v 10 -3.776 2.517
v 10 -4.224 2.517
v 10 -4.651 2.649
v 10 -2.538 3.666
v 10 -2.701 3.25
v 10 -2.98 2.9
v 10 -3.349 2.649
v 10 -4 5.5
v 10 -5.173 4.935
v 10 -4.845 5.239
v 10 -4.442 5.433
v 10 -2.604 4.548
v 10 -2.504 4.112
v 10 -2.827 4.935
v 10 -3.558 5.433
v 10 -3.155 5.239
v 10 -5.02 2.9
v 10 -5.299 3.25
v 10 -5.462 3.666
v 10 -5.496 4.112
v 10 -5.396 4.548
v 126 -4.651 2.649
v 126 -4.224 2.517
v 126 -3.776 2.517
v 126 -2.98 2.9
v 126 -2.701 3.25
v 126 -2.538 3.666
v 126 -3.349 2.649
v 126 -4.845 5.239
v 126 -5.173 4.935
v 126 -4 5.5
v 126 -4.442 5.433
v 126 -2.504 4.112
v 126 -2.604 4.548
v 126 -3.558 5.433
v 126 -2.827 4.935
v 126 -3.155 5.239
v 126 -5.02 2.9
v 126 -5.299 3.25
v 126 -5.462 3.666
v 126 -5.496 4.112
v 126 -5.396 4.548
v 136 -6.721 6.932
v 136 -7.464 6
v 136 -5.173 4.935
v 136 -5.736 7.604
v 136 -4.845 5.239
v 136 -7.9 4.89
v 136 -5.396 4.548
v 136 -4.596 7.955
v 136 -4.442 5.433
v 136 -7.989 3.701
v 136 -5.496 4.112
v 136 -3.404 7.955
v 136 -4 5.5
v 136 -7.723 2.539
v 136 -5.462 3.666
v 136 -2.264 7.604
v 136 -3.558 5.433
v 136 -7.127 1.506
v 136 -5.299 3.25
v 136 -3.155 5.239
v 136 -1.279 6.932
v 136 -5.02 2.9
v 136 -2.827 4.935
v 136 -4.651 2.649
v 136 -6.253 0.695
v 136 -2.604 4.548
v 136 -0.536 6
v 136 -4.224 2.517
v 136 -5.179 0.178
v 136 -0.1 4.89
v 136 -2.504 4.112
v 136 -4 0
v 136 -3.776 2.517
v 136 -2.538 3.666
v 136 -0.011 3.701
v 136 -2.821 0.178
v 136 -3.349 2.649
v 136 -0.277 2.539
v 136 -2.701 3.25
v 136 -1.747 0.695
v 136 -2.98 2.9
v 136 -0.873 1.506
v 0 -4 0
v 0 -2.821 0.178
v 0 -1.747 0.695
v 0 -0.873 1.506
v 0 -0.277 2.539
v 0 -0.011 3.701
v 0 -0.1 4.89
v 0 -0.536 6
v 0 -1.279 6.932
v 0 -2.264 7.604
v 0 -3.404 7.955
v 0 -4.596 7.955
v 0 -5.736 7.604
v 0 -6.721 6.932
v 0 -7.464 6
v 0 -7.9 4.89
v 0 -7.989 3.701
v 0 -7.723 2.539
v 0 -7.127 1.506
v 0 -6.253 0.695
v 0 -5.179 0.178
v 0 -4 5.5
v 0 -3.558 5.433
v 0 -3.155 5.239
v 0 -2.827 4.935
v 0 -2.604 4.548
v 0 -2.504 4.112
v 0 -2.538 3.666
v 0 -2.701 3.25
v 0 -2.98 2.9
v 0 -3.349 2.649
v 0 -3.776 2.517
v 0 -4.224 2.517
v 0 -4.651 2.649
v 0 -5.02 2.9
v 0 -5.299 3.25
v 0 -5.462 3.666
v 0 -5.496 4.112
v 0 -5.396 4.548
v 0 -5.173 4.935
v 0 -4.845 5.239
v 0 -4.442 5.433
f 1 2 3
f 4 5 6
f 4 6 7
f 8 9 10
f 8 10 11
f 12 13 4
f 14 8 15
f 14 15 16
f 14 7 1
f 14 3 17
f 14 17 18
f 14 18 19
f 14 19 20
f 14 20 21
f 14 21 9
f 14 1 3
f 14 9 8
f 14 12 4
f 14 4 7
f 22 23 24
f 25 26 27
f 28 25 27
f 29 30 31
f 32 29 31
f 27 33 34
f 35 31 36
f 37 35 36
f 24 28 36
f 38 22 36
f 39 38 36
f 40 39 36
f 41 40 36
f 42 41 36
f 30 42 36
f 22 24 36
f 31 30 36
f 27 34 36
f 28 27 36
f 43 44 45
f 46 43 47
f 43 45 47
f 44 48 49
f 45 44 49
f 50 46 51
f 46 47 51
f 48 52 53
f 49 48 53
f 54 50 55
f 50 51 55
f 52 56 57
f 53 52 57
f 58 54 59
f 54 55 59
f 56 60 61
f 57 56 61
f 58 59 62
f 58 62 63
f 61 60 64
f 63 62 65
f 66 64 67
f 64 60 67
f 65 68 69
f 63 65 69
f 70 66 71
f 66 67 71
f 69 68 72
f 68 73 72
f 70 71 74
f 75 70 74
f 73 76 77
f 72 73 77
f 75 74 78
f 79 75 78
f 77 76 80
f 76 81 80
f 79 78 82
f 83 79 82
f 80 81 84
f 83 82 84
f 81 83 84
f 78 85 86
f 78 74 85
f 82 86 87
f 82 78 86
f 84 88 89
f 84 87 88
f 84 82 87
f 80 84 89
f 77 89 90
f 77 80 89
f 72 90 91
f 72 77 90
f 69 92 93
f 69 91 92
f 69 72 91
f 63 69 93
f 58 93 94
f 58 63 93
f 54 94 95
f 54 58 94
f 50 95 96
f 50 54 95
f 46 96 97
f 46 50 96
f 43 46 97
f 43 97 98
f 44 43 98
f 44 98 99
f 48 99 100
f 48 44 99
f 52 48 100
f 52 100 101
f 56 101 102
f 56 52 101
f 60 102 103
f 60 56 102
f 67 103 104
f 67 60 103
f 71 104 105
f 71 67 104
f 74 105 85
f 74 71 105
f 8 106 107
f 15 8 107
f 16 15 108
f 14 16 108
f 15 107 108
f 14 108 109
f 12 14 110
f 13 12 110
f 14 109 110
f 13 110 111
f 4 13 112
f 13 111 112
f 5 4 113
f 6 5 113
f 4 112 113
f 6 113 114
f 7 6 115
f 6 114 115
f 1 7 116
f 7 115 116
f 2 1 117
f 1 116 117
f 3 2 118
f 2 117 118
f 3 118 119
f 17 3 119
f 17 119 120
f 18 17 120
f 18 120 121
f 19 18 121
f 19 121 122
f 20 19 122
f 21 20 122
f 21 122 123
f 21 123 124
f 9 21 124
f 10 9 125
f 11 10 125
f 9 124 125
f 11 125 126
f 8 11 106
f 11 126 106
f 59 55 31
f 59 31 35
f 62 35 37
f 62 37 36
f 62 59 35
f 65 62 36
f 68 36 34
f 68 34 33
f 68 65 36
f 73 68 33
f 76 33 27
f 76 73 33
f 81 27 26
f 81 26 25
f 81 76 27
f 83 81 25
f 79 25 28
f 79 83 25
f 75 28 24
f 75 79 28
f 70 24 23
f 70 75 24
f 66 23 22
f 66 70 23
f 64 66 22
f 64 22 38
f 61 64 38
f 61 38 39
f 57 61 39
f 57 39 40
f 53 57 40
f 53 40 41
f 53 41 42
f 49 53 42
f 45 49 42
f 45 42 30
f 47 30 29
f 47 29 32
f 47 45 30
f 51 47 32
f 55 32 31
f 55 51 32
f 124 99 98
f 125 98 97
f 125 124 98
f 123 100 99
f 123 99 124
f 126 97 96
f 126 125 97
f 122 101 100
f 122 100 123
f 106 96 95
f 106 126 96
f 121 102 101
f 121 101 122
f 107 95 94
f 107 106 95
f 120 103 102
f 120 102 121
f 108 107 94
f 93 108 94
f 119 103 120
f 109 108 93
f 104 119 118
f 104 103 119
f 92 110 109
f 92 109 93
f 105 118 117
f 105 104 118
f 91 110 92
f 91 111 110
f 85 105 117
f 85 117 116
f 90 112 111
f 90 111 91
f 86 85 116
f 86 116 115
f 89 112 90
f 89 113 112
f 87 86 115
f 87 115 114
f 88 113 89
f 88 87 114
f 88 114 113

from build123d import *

# Parameters (mm, degrees)
SKETCH_1_W          = 136
SKETCH_1_H          = 8
EXTRUDE_1_DEPTH     = 8
SKETCH_2_R          = 1.5
CUT_EXTRUDE_1_DEPTH = 10
CUT_EXTRUDE_START   = -126
SKETCH_2_2_R        = 1.5
CUT_EXTRUDE_2_DEPTH = 10
SKETCH_3_R          = 6
SKETCH_3_R_2        = 4
CUT_EXTRUDE_3_DEPTH = 137.469776874


with BuildPart() as part:
    # 草图1 → 凸台-拉伸1 (new body)
    with BuildSketch(Plane.XY):
        with Locations((68, -4)):
            Rectangle(SKETCH_1_W, SKETCH_1_H)
    extrude(amount=EXTRUDE_1_DEPTH)

    # 草图2 → 切除-拉伸1 (cut)
    with BuildSketch(Plane.ZY):
        with Locations((4, -4)):
            Circle(SKETCH_2_R)
    extrude(amount=-CUT_EXTRUDE_1_DEPTH, mode=Mode.SUBTRACT)

    # 草图2<2> → 切除-拉伸2 (cut)
    with BuildSketch(Plane.ZY.offset(CUT_EXTRUDE_START)):
        with Locations((4, -4)):
            Circle(SKETCH_2_2_R)
    extrude(amount=-CUT_EXTRUDE_2_DEPTH, mode=Mode.SUBTRACT)

    # 草图3 → 切除-拉伸3 (cut, through all)
    with BuildSketch(Plane(origin=(136, 0, 0), x_dir=(0, 0, -1), z_dir=(1, 0, 0))):
        with Locations((-4, -4)):
            Circle(SKETCH_3_R)
        with Locations((-4, -4)):
            Circle(SKETCH_3_R_2, mode=Mode.SUBTRACT)
    extrude(amount=-CUT_EXTRUDE_3_DEPTH, mode=Mode.SUBTRACT)


solid = part.part
